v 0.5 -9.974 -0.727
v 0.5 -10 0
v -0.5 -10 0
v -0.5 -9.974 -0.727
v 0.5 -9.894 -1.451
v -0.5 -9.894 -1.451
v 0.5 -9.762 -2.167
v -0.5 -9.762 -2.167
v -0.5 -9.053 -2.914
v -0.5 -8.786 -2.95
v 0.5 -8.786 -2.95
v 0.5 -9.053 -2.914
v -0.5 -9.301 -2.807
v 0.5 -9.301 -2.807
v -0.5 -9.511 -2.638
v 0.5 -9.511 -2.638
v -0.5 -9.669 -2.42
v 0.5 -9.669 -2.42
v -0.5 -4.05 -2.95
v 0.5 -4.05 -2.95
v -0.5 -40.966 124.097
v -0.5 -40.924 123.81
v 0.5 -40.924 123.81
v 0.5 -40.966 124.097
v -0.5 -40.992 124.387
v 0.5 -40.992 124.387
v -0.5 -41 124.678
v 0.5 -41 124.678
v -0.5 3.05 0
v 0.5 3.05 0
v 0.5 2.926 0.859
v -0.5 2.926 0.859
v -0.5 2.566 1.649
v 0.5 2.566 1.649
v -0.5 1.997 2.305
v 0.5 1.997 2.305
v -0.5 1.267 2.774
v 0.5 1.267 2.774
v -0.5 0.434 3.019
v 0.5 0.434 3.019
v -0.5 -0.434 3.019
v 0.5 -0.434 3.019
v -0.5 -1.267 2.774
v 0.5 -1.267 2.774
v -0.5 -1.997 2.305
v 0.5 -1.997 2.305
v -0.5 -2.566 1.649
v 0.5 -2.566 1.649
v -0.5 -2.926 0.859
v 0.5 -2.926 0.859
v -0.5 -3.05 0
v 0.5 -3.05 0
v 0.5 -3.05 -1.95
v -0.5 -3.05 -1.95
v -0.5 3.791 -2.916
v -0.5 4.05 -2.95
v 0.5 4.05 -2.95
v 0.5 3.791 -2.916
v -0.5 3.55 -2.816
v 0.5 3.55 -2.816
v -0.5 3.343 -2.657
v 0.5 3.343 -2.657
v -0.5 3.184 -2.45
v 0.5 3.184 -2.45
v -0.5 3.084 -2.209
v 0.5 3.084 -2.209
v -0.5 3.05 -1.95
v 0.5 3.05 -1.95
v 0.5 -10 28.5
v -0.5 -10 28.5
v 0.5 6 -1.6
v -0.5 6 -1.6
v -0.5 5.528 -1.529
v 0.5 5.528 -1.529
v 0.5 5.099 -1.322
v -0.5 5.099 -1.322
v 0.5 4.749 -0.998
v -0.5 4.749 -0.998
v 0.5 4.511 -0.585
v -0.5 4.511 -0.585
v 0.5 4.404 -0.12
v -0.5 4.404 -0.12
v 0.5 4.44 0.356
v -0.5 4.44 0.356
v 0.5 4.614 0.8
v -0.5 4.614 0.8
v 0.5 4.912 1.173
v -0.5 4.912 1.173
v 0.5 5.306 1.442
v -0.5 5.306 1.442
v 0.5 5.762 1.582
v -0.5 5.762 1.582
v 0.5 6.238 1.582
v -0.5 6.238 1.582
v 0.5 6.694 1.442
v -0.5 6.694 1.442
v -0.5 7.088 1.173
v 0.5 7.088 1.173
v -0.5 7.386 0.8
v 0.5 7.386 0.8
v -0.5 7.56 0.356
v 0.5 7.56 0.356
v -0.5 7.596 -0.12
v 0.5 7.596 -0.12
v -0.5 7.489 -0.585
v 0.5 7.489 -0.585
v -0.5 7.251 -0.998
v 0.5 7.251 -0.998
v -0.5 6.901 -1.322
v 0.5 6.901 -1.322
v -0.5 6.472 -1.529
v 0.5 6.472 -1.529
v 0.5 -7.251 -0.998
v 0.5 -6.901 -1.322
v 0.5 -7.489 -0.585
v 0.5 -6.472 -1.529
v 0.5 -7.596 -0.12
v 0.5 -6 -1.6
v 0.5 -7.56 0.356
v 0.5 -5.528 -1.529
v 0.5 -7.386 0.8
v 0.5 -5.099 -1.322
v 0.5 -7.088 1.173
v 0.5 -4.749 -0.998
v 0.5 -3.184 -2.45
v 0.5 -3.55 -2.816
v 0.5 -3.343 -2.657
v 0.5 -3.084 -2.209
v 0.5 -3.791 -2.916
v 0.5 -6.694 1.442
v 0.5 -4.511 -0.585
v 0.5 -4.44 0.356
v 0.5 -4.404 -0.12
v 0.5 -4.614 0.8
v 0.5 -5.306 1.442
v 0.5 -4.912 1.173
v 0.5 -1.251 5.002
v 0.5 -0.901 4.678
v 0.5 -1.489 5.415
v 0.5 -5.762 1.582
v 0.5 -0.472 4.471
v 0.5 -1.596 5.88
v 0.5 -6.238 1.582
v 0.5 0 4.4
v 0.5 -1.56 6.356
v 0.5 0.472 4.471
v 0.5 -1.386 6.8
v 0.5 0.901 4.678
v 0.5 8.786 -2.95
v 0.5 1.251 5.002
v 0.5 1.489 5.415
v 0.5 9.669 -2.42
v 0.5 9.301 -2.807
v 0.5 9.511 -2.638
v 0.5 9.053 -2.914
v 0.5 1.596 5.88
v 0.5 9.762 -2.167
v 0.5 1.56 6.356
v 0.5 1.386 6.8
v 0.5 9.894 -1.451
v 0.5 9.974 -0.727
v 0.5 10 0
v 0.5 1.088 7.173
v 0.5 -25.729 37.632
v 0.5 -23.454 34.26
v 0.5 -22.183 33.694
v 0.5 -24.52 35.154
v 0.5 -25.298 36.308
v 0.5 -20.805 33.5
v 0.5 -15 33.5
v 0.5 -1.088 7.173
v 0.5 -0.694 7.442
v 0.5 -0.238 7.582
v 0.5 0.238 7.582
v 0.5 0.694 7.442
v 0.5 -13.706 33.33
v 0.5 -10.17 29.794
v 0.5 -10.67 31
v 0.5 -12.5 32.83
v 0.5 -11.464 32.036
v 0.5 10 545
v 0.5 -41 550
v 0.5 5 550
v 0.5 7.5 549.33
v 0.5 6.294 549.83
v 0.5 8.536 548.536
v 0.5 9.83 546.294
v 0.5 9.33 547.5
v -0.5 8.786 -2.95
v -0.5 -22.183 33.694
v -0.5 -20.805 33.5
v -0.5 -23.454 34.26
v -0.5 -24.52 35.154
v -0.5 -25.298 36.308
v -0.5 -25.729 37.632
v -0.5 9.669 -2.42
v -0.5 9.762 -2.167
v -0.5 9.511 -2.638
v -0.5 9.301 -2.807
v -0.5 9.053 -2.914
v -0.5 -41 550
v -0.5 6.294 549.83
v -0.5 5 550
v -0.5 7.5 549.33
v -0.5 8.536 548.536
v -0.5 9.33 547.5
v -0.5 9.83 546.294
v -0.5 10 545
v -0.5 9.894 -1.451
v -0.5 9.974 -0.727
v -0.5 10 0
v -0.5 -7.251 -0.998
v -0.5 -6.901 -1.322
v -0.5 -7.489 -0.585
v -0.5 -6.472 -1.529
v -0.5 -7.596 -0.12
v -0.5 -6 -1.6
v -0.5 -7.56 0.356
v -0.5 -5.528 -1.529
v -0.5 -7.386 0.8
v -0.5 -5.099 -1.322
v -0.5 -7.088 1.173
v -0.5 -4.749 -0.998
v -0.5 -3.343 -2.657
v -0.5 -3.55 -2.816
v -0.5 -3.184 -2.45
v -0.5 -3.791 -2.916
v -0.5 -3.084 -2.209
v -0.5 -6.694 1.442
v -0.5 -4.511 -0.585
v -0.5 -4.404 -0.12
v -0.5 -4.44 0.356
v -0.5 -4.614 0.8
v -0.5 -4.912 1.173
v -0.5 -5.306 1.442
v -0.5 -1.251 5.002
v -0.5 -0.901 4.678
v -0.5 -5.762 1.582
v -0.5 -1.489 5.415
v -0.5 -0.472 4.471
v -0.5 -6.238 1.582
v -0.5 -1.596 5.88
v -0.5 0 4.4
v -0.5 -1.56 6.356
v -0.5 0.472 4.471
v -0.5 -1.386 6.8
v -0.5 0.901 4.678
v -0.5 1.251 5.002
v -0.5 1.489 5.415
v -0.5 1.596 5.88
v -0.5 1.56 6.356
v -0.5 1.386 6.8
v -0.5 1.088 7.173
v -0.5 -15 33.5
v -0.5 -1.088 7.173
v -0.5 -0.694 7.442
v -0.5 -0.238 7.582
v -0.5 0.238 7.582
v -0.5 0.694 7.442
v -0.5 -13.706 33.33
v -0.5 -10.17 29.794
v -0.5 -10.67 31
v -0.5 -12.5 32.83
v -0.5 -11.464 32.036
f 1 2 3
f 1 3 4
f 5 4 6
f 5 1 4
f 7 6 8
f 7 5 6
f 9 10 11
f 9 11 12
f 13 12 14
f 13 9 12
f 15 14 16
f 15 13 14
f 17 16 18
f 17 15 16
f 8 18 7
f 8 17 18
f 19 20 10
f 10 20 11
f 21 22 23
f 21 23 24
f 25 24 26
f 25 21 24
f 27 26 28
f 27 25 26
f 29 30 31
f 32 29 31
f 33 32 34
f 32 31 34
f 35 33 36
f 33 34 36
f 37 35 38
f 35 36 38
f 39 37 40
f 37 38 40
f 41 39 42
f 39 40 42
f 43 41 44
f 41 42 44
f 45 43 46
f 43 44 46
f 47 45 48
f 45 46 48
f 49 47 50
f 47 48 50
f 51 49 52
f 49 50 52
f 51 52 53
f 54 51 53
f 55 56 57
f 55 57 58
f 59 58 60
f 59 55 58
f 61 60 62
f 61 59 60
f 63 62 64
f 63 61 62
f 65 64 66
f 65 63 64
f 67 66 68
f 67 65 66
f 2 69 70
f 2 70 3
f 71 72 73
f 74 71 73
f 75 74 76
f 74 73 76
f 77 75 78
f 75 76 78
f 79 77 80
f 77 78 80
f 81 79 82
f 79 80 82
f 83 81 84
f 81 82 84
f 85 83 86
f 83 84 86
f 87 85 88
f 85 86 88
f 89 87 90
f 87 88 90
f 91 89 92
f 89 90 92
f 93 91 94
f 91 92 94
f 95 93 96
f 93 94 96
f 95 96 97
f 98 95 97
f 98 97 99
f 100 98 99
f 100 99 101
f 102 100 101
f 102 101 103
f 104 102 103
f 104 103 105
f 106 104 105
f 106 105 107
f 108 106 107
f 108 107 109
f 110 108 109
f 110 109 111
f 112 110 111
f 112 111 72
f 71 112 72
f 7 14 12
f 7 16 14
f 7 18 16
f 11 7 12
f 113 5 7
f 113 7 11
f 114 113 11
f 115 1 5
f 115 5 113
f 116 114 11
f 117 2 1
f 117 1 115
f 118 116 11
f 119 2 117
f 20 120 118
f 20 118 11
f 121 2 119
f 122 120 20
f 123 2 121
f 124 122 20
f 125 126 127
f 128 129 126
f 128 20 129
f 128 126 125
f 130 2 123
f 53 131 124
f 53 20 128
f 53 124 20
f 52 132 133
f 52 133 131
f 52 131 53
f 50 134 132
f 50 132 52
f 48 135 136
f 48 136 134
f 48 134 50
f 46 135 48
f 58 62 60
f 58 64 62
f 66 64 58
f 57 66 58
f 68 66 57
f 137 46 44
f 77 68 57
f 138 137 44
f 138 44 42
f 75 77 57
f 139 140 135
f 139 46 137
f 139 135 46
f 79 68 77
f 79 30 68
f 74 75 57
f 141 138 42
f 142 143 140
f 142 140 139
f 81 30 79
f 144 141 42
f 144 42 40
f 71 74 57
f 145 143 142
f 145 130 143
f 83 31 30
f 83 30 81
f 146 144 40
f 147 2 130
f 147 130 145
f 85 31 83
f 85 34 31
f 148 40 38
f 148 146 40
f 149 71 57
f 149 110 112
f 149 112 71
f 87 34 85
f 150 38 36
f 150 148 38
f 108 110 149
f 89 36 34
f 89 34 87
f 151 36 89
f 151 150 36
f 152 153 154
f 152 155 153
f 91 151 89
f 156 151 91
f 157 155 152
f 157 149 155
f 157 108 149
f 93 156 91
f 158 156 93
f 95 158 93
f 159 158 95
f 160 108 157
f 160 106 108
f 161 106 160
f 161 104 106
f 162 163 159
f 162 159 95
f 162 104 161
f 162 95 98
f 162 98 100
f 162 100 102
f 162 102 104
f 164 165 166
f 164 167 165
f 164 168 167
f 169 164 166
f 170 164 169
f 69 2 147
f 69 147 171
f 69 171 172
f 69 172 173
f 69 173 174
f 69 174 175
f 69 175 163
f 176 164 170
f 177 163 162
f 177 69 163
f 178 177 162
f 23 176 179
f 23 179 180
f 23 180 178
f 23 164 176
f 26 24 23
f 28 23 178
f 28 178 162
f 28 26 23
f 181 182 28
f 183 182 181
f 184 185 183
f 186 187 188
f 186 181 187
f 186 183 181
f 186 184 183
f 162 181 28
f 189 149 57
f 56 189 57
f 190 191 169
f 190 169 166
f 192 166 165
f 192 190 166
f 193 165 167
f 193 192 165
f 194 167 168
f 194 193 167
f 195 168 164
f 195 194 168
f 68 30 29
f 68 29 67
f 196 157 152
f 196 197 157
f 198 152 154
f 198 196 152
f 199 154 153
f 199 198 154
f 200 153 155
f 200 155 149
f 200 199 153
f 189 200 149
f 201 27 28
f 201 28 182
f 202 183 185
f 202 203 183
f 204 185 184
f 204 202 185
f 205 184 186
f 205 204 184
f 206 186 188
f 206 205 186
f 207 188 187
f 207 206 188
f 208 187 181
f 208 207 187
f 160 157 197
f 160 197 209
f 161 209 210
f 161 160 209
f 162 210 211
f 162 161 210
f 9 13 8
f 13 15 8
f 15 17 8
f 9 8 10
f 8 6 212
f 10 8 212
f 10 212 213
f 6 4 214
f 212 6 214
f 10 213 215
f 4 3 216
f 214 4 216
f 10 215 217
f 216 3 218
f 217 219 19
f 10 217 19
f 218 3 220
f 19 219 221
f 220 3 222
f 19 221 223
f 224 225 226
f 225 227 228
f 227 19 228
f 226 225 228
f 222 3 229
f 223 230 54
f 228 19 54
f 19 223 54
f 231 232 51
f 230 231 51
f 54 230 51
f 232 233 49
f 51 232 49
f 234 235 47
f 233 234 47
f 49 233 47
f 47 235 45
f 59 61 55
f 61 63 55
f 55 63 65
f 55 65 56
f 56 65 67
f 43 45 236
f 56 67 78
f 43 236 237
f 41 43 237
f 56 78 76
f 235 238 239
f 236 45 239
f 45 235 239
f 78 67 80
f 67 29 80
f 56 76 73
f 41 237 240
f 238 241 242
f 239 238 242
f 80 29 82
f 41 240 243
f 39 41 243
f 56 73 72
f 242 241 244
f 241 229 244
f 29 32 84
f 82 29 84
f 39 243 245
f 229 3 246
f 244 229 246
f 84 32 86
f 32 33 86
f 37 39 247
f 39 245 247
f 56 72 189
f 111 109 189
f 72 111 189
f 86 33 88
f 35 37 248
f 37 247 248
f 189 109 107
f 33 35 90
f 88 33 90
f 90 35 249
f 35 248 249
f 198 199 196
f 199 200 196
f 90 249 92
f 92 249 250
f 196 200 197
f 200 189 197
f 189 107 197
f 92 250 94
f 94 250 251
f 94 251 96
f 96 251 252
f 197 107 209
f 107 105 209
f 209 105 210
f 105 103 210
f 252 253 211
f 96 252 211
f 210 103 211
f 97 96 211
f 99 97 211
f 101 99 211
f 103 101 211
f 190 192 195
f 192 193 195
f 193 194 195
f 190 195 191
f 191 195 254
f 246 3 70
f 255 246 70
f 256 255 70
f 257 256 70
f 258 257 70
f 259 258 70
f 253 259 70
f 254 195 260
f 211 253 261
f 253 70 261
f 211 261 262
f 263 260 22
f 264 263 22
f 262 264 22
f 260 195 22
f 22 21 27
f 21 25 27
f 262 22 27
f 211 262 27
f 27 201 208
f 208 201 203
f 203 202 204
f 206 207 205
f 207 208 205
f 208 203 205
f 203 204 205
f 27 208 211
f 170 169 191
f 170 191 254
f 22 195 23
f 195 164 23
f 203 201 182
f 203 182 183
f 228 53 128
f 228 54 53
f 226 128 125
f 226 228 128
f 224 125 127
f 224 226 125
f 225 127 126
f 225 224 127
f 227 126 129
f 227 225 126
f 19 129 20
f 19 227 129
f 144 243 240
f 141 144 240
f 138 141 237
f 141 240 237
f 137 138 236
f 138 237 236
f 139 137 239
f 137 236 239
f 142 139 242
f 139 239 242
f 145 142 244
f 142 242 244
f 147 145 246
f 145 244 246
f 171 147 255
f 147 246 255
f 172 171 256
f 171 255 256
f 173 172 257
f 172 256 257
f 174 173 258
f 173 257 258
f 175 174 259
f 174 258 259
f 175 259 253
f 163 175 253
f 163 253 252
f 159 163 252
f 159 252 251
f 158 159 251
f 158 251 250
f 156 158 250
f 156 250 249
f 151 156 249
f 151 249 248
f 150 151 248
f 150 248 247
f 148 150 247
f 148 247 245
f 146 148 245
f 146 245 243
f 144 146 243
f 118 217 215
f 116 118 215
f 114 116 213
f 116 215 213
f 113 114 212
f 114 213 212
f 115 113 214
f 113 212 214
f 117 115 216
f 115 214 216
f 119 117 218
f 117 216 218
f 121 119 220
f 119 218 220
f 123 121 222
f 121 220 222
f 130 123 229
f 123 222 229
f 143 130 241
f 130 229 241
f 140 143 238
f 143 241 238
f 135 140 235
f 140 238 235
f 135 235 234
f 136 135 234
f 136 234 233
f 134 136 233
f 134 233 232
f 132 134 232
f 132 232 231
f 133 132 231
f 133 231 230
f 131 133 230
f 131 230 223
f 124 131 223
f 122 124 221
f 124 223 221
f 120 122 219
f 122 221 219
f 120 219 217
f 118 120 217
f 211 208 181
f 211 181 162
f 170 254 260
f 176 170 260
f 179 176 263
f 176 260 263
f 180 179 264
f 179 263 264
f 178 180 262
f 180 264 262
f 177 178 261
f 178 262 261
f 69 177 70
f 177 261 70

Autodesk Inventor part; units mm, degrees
ref_plane "YZ Plane" through (0, 0, 0) normal (1, 0, 0) x (0, 1, 0)
ref_plane "XZ Plane" through (0, 0, 0) normal (0, 1, 0) x (-1, 0, 0)
ref_plane "XY Plane" through (0, 0, 0) normal (0, 0, 1) x (1, 0, 0)
sketch "スケッチ1" plane through (0, 0, 0) normal (1, 0, 0) x (0, 1, 0)
  line L0 (-41, 550) -> (10, 550)
  line L1 (10, 550) -> (10, -10)
  line L2 (10, -10) -> (-41, -10)
  line L3 (-41, -10) -> (-41, 550)
  line L4 (-41, 550) -> (10, -10) construction
  line L5 (10, 550) -> (-41, -10) construction
  point P0 (0, 0)
  dimension "d0" = 51
  dimension "d1" = 560
  dimension "d42" = 10
  dimension "d43" = 10
extrude "プレート1" add sketch "スケッチ1" along normal mid plane 1
sketch "スケッチ3" plane through (0.5, 0, 0) normal (1, 0, 0) x (0, 0, -1)
  circle A0 centre (0, 0) radius 6
  line L0 (10, 10) -> (10, -41) projected
  line L1 (-550, 10) -> (10, 10) projected
  point P0 (0, 0)
  point P1 (0, 6)
  point P2 (-6, 0)
  point P3 (0, -6)
  point P4 (6, 0)
  dimension "d13" = 12
  dimension "d14" = 10
  dimension "d15" = 10
  dimension "d18" = 360
  dimension "d44" = 0
hole "穴2" at (0.5, 6, 0) at (0.5, 0, 6) at (0.5, -6, 0) at (0.5, 0, -6) direction (-1, 0, 0) diameter 3.2 end through all clearance for "Socket Head Cap Screw" size "M3" standard "Ansi Metric M Profile"
sketch "スケッチ4" plane through (0.5, 0, 0) normal (1, 0, 0) x (0, 0, -1)
  circle A0 centre (0, 0) radius 3.05
  point P0 (0, 0)
  dimension "d27" = 6.1
extrude "押し出し1" cut sketch "スケッチ4" against normal blind 10
sketch "スケッチ5" plane through (0.5, 0, 0) normal (1, 0, 0) x (0, 0, -1)
  line L0 (10, -41) -> (-33.5, -41)
  line L1 (-33.5, -41) -> (-33.5, -10)
  line L2 (-33.5, -10) -> (10, -10)
  line L3 (10, -10) -> (10, -41)
  line L4 (-550, 10) -> (-53.5, 10)
  line L5 (-53.5, 10) -> (-53.5, -12)
  line L6 (-53.5, -12) -> (-550, -12)
  line L7 (-550, -12) -> (-550, 10)
  line L8 (10, -41) -> (-550, -41) projected
  circle A0 centre (0, 0) radius 3.05 projected
  circle A1 centre (0, 0) radius 3.05 projected
  line L9 (0, 3.05) -> (10, 3.05)
  line L10 (0, -3.05) -> (10, -3.05)
  line L11 (10, 10) -> (10, -41) projected
  circle A2 centre (0, 0) radius 10
  circle A3 centre (0, 6) radius 1.6 projected
  circle A4 centre (0, -6) radius 1.6 projected
  line L12 (-550, 10) -> (10, 10) projected
  line L13 (2.95, 10) -> (2.95, -10)
  point P0 (0, 0)
  point P1 (2.95, -3.05)
  point P2 (2.95, 3.05)
  point P3 (2.95, 0.7746)
  point P4 (2.95, -0.7746)
  point P5 (9.5235, -3.05)
  point P6 (0, -10)
  point P7 (0, 10)
  point P8 (9.5235, 3.05)
  point P9 (10, 0)
  point P10 (2.95, -9.555)
  point P11 (2.95, 9.555)
  dimension "d35" = 29
  dimension "d36" = 20
  dimension "d40" = 33.5
  dimension "d41" = 10
  dimension "d45" = 2.95
extrude "押し出し2" cut sketch "スケッチ5" against normal blind 10 contours L0 L1 L2 L3 | L2 L13 A2 L10 L11 | L2 A2 L13 | L10 A2 L11 | L13 L10 A2 | L10 L13 A0 L9 A2 | A2 L9 L11 | L12 L13 A2 | L10 A0 L13 | L9 A2 L13 L12 L11 | L9 L13 A2 | L13 A0 L9 picked at (5.1412, -2.2915)
fillet "コーナーR4" radius 1 4 edges at (0, -3.05, -2.95) (0, 3.05, -2.95) (0, 9.555, -2.95) (0, -9.555, -2.95)
sketch "スケッチ6" plane through (0.5, 0, 0) normal (1, 0, 0) x (0, 0, -1)
  line L0 (-33.5, -41) -> (-550, -41) projected
  line L1 (-33.5, -41) -> (-33.5, -10) projected
  line L2 (-33.5, -25) -> (-124.2405, -41)
  point P0 (0, 0)
  point P1 (-545, -41)
  point P2 (-33.5, -15)
  dimension "d51" = 10
  dimension "d52" = 16
extrude "押し出し3" cut sketch "スケッチ6" against normal blind 10
fillet "コーナーR5" radius 5 2 edges at (0, -25, 33.5) (0, -41, 124.2405)
fillet "コーナーR6" radius 5 2 edges at (0, -10, 33.5) (0, 10, 550)
equation "\"d15\" = d14"
equation "\"d25\" = Thickness"
equation "\"d2\" = Thickness"
equation "\"d43\" = d42"
equation "\"BendRadius\" = Thickness"
equation "\"BendReliefWidth\" = Thickness"
equation "\"BendReliefDepth\" = 0.5 * Thickness"
equation "\"CornerReliefSize\" = 4 * Thickness"
equation "\"MinimumRemnant\" = 2 * Thickness"
equation "\"TransitionRadius\" = BendRadius"
equation "\"JacobiRadiusSize\" = BendRadius"
equation "\"GapSize\" = Thickness"
equation "\"Thickness\" = 1"
properties part number "s_carbon_plate5" material "CFRP"
